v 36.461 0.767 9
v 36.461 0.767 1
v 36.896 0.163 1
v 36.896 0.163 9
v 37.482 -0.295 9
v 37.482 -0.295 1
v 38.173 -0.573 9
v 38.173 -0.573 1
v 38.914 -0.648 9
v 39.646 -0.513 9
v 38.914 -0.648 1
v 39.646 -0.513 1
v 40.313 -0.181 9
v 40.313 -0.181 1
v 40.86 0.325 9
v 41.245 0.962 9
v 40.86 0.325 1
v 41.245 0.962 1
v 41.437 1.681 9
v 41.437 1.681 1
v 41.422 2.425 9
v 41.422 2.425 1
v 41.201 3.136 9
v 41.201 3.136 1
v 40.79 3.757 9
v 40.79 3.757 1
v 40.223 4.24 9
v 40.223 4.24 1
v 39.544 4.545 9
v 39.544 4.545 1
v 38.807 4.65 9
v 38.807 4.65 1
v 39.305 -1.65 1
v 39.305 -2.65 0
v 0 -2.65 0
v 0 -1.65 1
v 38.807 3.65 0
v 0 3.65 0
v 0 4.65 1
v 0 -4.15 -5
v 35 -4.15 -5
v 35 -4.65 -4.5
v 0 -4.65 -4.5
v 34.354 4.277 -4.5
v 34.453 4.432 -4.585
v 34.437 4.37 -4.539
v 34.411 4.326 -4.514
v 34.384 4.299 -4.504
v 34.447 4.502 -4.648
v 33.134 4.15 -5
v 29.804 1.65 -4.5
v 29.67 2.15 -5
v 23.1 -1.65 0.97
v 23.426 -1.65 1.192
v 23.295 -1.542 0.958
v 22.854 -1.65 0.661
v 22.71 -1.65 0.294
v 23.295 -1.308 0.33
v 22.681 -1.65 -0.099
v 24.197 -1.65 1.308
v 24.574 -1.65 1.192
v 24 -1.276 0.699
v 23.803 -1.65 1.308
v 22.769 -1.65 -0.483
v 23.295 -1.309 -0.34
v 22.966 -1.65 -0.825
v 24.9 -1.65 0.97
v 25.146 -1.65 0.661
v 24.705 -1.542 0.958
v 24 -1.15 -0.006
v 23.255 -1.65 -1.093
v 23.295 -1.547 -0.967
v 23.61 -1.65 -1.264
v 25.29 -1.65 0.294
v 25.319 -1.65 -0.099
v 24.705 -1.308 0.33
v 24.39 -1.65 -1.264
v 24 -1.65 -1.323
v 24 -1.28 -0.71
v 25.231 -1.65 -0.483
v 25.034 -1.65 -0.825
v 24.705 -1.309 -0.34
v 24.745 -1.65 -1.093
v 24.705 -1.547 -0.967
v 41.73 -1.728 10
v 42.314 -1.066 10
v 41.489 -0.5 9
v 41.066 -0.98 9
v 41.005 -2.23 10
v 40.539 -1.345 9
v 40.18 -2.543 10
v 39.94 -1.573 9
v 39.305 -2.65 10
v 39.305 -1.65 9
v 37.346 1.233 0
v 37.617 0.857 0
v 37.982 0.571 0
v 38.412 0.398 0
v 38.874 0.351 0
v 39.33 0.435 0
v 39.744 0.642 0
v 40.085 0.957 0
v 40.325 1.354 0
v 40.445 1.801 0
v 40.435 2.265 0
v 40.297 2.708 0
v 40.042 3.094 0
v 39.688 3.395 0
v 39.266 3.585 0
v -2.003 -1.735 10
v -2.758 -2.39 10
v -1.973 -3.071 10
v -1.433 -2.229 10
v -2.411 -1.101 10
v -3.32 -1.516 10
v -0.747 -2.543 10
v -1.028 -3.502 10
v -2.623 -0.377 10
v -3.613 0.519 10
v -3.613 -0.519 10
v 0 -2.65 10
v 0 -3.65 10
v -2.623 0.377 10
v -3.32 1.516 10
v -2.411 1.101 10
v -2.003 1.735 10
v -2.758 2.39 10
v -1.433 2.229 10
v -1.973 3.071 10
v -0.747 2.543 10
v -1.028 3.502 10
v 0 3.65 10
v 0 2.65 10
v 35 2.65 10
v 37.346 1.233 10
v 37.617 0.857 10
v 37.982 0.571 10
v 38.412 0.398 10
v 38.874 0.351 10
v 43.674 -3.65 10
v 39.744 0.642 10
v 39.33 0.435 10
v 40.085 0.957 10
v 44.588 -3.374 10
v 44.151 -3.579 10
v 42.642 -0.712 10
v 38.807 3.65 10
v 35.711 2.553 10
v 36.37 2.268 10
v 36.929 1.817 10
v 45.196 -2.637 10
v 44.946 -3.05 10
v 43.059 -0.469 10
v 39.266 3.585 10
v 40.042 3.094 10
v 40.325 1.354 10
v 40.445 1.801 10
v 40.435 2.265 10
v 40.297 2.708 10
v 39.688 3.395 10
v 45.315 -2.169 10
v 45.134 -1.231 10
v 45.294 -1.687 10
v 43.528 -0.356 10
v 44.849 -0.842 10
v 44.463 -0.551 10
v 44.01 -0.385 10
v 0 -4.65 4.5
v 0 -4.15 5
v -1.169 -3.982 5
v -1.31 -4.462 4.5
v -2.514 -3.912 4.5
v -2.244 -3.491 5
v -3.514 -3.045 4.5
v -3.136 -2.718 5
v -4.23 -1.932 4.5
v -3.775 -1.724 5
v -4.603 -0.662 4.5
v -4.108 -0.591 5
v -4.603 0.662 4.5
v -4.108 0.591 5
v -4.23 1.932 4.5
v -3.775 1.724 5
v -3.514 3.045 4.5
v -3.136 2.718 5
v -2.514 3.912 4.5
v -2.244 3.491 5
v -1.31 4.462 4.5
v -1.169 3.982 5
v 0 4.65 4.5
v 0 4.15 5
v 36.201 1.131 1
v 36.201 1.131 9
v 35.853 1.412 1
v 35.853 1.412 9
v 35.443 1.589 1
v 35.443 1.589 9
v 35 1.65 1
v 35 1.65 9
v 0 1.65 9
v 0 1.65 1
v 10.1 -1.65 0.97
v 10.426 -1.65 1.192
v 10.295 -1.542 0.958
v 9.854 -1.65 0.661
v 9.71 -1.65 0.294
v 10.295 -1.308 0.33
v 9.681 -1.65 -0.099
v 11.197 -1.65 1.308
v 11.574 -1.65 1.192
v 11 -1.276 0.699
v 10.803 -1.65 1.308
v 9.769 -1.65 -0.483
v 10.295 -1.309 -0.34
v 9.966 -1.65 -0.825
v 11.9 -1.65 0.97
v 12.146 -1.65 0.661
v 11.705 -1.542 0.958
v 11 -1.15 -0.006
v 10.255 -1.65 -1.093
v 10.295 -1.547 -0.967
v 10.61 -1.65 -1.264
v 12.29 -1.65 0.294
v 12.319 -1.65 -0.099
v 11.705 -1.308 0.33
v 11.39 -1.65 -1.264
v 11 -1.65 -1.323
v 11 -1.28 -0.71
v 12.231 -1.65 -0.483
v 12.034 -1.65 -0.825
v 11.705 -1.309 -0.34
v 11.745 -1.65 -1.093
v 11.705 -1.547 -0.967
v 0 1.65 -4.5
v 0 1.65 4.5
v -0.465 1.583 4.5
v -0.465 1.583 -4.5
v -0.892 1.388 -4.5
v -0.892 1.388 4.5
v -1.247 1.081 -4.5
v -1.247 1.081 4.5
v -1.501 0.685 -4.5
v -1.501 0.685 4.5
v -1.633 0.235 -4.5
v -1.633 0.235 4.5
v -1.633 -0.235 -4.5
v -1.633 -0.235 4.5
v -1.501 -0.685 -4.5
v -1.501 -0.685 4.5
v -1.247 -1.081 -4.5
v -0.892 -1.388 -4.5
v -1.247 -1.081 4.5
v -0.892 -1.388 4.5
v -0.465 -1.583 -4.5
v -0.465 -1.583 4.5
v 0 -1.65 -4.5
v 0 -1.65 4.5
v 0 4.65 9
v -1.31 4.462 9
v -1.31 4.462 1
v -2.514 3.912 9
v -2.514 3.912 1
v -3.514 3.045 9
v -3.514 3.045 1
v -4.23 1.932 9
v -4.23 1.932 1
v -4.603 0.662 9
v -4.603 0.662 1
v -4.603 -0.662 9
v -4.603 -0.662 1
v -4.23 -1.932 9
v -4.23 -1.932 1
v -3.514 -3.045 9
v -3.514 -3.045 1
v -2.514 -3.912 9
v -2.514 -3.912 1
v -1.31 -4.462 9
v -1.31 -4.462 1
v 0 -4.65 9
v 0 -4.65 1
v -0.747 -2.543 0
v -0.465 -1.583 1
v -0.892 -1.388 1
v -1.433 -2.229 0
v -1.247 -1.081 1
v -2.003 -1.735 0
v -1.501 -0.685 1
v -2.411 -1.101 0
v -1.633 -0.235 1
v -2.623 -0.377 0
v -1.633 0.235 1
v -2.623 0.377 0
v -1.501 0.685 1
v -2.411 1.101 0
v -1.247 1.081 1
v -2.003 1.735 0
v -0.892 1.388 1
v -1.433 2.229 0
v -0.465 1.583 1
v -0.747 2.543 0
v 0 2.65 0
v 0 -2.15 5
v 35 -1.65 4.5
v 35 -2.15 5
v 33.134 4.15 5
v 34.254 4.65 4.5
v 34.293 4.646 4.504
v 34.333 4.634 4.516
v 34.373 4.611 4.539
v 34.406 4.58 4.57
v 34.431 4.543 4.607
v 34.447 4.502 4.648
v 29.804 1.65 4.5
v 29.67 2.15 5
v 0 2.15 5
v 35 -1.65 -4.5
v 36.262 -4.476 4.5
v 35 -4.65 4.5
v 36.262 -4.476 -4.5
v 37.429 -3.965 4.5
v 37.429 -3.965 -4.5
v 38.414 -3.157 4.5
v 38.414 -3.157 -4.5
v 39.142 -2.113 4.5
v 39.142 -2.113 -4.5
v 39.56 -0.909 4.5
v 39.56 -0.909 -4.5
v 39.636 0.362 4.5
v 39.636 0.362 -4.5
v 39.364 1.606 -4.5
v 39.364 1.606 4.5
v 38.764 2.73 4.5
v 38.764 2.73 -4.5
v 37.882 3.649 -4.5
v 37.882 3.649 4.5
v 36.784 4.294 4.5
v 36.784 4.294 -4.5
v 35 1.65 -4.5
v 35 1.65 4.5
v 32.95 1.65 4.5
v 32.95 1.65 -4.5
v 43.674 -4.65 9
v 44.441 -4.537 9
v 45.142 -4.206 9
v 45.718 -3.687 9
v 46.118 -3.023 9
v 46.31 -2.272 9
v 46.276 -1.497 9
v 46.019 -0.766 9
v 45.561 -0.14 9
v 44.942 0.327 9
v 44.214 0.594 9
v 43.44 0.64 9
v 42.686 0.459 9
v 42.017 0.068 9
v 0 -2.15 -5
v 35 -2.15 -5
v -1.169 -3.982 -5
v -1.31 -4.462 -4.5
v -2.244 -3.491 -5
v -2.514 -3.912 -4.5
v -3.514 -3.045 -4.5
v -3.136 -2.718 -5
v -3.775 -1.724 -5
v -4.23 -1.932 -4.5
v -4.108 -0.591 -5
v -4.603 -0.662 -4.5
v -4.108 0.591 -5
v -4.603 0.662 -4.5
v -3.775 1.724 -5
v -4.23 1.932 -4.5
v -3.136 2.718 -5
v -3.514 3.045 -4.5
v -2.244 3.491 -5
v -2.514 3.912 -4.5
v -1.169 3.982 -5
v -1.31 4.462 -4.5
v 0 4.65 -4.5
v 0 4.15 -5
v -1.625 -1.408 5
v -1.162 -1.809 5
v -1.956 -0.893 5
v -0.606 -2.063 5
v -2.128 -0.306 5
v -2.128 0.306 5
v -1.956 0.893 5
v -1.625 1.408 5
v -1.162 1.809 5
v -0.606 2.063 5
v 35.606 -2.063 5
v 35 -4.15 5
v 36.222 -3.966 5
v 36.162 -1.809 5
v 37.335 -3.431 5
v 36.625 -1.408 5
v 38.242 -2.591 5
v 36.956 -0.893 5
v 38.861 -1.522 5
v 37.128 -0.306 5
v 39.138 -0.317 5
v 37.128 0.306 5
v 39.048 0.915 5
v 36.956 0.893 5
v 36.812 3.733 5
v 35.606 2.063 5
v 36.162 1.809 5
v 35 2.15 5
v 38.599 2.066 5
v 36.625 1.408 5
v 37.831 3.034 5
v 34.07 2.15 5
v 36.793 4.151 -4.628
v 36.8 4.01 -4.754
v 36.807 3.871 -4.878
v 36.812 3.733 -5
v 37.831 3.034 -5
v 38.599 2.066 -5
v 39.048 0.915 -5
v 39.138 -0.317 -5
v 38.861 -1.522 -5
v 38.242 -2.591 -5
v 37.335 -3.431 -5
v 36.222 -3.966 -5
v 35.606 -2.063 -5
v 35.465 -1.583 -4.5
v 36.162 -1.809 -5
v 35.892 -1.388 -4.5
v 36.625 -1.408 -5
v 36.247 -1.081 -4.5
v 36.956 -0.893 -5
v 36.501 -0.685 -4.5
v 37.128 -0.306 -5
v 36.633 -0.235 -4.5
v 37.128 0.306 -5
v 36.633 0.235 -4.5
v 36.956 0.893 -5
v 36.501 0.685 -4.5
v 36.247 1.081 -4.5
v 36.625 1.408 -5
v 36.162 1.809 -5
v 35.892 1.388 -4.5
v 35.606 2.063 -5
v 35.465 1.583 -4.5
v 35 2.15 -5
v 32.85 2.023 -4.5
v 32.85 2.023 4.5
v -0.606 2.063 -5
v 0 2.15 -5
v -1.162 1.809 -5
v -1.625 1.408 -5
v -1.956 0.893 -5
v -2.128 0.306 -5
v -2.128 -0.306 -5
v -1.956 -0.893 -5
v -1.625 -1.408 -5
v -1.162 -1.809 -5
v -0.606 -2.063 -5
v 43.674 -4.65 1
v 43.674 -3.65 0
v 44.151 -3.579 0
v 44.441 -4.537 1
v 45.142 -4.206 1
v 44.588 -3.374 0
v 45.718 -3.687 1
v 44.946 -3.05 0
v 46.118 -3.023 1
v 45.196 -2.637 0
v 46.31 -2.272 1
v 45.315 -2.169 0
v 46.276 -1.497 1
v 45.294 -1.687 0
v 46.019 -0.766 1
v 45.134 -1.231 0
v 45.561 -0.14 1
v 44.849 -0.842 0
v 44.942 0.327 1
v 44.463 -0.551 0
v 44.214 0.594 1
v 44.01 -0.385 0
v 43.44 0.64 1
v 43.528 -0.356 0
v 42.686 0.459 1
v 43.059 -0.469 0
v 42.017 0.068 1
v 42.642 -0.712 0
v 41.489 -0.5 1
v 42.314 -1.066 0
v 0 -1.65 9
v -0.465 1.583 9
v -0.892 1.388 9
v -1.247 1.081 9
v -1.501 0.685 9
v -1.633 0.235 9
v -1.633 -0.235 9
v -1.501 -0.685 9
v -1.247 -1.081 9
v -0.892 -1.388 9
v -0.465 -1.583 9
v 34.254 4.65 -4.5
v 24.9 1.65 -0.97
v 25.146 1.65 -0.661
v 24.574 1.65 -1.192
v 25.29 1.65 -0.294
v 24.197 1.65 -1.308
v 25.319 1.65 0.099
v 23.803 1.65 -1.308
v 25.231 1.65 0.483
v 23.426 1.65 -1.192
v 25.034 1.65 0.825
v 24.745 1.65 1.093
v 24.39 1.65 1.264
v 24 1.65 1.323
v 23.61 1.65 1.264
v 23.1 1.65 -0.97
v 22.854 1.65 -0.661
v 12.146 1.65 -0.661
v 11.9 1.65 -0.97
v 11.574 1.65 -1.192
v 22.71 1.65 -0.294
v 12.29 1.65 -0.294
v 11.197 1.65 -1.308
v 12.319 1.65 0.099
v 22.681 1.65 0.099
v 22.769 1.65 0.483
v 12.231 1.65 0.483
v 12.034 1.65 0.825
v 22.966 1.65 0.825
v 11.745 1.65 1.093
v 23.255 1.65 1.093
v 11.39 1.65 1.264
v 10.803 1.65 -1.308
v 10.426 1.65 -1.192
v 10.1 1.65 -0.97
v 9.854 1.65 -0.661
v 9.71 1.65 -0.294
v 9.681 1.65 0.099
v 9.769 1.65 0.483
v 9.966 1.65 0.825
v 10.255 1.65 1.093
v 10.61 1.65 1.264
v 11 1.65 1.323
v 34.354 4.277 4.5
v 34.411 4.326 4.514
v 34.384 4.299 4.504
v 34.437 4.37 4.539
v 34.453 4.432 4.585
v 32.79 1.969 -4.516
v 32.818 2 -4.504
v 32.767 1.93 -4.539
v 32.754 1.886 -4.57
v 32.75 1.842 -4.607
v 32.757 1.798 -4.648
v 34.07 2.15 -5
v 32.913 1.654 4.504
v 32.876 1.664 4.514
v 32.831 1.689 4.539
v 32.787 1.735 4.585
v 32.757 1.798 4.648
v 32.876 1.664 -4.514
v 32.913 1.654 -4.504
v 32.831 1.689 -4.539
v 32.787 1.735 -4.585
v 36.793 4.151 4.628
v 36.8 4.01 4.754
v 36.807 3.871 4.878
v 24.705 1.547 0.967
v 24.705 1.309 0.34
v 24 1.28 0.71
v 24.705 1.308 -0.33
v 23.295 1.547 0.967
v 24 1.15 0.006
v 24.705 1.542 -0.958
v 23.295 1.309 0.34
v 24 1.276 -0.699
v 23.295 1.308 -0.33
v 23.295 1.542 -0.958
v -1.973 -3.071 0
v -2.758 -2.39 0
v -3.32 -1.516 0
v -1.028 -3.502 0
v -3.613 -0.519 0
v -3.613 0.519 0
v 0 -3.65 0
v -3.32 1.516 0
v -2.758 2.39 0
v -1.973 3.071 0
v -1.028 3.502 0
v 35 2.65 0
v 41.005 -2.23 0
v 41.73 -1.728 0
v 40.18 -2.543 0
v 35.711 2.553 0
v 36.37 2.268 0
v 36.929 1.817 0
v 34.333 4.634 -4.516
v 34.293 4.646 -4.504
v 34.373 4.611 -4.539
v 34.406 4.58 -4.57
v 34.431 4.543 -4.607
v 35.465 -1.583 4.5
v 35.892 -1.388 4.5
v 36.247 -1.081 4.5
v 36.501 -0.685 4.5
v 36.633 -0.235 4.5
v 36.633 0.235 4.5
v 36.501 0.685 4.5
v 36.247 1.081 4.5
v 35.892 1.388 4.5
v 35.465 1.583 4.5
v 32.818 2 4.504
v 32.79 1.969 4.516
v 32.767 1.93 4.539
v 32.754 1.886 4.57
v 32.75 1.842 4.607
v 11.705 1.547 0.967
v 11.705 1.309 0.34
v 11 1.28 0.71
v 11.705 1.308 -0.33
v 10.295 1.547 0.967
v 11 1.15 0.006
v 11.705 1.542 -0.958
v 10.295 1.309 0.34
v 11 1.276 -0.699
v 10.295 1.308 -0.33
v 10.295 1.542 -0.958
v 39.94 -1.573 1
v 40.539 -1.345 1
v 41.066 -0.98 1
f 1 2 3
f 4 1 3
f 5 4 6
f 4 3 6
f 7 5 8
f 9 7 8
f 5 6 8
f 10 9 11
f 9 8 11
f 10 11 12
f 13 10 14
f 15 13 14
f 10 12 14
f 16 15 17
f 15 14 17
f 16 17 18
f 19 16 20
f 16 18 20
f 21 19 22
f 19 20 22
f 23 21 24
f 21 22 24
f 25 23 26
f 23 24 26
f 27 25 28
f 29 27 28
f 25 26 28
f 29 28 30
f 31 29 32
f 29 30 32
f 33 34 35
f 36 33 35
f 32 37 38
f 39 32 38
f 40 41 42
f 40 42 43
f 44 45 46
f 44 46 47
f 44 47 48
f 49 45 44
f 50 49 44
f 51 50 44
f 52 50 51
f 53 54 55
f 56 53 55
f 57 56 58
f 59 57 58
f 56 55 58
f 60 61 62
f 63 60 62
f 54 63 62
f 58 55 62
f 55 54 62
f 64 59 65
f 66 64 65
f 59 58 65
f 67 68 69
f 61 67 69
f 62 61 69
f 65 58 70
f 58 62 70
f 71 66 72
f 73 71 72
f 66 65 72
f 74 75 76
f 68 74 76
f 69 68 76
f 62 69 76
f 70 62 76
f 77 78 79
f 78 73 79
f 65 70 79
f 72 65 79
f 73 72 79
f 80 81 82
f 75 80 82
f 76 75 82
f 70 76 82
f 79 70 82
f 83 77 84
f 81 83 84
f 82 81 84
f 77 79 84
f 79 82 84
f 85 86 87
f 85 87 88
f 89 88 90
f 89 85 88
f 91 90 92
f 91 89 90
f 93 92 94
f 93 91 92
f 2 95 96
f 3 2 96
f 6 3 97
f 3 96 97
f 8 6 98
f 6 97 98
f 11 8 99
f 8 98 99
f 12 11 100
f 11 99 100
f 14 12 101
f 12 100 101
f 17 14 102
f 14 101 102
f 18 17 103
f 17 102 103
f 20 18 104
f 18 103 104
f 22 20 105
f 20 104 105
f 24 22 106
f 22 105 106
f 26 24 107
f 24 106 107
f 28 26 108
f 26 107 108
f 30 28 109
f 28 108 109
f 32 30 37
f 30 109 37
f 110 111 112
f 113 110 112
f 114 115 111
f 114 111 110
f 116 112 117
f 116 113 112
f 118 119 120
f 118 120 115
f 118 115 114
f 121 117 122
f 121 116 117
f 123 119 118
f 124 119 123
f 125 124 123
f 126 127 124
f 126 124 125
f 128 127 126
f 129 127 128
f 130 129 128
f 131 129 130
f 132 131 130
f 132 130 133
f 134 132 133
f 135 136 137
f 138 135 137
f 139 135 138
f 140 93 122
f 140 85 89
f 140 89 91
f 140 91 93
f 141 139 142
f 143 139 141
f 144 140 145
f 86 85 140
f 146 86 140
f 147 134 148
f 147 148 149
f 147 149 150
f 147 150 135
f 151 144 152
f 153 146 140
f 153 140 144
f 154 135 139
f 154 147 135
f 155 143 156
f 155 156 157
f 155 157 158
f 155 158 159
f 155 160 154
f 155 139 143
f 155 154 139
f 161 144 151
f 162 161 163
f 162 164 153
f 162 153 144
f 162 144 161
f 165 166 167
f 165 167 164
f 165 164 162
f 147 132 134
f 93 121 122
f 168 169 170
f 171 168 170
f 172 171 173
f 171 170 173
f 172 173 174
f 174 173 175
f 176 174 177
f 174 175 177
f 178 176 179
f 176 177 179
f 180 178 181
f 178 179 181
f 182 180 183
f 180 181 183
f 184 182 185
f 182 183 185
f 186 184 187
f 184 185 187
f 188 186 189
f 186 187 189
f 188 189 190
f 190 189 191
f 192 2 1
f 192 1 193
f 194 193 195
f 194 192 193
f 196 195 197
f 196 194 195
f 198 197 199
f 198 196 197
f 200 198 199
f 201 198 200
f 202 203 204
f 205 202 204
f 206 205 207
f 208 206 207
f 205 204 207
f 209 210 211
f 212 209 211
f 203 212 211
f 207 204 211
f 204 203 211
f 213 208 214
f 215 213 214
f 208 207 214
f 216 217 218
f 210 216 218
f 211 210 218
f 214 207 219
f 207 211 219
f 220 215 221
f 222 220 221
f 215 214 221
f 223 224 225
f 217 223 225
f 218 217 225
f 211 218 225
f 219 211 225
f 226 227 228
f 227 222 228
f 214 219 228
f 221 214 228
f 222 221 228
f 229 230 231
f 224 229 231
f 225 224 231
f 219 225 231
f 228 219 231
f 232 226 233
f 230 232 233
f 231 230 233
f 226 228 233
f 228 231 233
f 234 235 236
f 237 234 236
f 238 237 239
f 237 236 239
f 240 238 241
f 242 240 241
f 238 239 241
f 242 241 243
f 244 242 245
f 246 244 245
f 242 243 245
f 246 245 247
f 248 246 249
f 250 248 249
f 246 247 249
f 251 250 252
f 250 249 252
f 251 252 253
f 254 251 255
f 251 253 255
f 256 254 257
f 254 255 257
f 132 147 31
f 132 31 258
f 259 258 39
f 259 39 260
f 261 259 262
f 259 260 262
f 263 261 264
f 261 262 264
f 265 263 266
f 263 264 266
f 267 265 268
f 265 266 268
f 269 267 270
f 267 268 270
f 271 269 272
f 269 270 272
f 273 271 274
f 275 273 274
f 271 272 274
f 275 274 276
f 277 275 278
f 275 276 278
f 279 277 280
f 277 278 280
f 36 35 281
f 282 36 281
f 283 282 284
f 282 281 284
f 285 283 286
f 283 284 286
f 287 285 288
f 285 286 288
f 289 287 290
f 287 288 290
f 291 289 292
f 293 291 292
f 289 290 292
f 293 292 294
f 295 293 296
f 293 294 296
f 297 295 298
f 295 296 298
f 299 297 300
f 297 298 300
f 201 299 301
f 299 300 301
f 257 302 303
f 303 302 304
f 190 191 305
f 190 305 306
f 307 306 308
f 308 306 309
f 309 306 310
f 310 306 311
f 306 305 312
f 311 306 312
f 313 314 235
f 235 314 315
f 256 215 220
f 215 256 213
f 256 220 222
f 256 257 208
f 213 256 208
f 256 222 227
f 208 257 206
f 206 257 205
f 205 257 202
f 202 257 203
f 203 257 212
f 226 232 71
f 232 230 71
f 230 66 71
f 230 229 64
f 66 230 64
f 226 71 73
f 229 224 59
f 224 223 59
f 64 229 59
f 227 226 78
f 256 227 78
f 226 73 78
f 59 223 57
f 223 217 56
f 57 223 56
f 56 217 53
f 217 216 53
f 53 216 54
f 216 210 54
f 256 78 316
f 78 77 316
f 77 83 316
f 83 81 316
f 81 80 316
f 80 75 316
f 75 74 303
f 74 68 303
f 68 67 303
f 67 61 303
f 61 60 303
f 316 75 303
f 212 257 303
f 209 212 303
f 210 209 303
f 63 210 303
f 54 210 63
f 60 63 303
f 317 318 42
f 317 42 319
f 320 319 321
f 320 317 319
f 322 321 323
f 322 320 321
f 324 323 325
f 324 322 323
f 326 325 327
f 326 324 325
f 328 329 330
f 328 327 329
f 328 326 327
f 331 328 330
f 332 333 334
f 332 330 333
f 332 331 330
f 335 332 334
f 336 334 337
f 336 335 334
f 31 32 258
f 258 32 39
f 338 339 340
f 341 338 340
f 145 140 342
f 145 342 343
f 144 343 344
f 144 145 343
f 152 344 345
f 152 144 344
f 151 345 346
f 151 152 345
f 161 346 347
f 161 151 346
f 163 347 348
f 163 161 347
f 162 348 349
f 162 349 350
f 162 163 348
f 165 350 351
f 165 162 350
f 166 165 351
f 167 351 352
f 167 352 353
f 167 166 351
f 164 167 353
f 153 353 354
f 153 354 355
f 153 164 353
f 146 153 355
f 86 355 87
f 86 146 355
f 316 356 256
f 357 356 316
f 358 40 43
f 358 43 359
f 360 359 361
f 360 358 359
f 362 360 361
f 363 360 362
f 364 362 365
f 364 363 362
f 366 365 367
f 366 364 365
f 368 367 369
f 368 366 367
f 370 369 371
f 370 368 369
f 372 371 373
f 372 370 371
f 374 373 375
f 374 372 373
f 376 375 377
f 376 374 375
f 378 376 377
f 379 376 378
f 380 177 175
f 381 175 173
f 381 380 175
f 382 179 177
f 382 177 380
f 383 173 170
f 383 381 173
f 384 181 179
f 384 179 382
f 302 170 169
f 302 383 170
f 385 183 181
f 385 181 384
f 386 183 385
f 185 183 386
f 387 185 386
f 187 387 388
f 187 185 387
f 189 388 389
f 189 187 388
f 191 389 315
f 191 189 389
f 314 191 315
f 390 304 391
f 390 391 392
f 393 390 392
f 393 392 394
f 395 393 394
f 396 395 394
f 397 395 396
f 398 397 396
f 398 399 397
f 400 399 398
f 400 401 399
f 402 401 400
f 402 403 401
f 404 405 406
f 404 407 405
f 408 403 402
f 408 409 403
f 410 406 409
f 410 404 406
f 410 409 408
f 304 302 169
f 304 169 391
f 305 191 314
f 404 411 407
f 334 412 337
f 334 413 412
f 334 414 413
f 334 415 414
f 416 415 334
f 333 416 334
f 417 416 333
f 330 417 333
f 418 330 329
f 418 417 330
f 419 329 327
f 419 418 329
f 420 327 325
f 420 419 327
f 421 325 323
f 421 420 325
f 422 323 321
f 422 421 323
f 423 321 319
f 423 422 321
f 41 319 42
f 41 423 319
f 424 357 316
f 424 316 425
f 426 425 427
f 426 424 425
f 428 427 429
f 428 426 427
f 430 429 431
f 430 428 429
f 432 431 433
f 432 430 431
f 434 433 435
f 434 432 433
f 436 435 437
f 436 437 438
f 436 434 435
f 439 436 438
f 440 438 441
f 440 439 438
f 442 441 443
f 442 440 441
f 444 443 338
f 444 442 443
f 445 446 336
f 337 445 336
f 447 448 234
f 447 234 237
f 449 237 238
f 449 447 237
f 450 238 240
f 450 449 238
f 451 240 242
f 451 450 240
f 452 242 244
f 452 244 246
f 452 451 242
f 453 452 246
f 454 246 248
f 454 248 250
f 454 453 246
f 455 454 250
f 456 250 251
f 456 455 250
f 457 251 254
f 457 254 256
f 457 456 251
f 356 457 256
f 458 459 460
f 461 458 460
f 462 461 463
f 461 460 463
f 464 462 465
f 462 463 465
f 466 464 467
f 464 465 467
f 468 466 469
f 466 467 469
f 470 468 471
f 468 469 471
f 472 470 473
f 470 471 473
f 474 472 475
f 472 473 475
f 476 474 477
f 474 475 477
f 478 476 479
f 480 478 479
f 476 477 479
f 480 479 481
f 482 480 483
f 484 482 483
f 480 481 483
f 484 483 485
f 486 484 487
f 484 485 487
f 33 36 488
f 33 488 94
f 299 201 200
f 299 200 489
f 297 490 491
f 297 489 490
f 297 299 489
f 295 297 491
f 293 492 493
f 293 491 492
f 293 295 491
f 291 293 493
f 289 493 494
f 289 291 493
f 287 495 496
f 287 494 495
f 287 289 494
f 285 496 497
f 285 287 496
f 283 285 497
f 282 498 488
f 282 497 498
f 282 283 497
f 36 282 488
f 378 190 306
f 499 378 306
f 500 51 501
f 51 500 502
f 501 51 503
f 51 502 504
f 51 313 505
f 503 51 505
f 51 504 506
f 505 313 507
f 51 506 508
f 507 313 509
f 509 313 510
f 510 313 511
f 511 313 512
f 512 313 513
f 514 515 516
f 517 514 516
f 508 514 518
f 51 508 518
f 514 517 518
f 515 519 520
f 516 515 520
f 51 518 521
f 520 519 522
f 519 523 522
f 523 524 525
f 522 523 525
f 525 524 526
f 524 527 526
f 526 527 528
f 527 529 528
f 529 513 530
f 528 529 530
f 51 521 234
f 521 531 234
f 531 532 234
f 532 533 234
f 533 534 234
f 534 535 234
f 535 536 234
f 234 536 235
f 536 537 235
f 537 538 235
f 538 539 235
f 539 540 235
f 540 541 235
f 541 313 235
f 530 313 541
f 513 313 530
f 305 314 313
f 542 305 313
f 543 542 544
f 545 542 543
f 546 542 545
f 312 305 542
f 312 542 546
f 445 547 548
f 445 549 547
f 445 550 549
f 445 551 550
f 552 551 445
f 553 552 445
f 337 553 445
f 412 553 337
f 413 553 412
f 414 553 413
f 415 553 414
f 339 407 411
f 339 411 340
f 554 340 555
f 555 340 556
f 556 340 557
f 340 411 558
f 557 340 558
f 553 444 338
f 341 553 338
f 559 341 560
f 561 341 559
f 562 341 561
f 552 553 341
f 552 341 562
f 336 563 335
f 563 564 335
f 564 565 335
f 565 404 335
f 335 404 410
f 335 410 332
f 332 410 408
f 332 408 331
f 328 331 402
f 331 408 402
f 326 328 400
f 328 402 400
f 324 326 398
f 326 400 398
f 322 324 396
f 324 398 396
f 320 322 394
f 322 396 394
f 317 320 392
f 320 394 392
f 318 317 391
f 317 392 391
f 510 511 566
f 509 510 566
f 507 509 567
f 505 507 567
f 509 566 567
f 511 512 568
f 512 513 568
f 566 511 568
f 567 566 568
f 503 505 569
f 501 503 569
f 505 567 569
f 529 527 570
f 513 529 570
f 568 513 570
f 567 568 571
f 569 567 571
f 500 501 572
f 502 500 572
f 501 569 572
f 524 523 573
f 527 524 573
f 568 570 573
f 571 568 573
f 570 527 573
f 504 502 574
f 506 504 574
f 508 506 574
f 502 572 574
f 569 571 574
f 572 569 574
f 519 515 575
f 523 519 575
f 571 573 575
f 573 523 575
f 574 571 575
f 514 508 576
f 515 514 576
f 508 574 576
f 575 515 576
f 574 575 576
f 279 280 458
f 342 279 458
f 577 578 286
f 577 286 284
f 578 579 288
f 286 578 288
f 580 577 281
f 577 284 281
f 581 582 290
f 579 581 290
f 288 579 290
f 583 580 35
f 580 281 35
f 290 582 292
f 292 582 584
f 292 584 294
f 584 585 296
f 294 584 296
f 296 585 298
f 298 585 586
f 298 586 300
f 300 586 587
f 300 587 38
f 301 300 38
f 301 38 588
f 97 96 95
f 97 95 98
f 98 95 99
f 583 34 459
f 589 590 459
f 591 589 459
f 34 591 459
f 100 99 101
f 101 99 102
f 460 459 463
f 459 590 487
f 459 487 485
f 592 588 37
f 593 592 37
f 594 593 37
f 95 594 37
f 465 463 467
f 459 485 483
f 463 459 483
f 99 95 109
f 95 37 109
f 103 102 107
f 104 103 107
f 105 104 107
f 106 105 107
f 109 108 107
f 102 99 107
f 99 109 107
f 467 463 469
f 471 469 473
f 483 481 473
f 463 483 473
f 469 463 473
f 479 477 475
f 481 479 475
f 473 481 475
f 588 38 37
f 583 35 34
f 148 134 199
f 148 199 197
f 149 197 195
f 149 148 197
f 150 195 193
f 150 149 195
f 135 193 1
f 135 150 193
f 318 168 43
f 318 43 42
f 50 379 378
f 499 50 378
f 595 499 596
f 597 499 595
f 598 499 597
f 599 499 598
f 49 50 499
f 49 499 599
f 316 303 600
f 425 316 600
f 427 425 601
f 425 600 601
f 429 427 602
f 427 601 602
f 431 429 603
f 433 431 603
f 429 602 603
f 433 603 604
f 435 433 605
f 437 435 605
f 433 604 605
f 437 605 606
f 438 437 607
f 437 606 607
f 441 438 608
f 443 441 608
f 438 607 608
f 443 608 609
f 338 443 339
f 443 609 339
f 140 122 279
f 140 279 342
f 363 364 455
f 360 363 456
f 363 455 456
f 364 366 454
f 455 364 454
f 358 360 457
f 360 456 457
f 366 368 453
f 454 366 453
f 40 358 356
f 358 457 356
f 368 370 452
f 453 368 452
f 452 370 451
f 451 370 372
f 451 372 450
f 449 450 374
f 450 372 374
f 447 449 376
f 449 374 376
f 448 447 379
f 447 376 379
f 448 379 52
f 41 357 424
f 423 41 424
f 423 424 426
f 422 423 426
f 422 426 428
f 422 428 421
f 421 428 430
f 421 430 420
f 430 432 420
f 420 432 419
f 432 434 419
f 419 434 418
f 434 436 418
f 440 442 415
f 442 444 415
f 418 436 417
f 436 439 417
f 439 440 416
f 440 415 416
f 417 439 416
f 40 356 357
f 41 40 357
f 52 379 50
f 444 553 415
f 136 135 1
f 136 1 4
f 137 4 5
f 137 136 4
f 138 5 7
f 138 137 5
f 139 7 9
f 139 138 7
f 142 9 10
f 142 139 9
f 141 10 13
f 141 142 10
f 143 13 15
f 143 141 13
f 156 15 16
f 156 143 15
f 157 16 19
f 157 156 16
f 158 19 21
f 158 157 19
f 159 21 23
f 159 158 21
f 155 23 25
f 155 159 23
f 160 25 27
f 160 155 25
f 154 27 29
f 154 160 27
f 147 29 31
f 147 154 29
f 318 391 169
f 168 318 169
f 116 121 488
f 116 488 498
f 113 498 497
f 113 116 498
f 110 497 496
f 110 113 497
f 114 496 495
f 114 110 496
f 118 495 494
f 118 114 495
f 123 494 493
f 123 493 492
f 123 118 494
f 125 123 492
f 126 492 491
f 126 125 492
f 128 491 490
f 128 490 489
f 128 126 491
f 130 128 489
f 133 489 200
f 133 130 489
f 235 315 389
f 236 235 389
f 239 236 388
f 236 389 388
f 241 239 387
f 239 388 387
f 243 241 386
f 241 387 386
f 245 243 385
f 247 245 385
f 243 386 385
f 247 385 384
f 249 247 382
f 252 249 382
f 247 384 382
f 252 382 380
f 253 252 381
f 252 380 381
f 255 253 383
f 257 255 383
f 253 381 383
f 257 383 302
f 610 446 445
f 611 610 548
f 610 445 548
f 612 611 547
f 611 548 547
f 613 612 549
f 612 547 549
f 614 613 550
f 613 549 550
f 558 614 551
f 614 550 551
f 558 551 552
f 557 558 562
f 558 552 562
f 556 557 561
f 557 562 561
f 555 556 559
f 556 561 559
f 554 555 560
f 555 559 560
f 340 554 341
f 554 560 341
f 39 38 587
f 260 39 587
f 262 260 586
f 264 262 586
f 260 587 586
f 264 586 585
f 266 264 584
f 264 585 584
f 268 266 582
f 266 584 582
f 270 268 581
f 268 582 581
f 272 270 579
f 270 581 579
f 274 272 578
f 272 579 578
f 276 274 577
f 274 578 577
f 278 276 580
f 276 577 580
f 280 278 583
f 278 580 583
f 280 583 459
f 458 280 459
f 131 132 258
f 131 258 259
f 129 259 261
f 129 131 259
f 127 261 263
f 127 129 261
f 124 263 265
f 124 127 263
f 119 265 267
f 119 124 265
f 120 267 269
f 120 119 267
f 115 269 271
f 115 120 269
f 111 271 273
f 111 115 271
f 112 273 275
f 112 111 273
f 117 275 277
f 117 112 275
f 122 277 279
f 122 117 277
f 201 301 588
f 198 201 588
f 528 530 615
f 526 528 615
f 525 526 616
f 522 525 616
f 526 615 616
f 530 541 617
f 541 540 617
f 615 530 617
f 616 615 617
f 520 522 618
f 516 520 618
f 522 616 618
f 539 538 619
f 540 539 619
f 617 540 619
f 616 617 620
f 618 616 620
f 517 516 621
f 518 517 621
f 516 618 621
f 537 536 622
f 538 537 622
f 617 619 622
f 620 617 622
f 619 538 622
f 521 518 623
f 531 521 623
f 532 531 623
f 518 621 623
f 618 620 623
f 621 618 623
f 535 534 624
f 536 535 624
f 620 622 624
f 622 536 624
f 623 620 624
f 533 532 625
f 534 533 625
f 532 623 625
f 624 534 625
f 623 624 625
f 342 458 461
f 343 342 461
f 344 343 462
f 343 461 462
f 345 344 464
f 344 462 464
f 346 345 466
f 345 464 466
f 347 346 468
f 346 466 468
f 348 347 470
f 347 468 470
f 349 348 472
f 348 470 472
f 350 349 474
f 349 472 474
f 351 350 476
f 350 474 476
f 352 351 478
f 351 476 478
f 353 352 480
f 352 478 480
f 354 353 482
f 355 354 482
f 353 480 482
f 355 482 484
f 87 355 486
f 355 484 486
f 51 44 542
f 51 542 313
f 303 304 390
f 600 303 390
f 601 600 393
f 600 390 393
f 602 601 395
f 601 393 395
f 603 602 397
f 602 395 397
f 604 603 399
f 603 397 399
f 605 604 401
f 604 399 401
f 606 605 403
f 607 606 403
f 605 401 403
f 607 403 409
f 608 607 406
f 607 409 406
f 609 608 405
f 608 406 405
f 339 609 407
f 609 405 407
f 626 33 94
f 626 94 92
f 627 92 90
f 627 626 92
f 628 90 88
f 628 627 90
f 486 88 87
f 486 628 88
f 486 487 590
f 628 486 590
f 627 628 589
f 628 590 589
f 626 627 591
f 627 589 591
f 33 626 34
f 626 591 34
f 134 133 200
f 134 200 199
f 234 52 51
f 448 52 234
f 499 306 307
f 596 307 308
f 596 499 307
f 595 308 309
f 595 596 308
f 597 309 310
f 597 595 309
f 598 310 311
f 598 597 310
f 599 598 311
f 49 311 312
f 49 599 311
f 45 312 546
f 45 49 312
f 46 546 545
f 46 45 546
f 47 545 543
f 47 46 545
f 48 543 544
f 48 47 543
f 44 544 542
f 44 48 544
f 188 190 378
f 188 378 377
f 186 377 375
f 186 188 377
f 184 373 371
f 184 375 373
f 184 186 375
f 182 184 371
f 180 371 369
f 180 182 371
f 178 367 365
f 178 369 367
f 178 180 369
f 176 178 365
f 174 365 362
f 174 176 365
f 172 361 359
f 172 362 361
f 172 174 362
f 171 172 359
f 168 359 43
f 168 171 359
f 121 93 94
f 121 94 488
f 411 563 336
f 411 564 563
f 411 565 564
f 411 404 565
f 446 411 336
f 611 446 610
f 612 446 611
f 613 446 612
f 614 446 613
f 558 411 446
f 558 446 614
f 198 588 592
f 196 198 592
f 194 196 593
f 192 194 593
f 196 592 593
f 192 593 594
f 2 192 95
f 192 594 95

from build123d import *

# Parameters (mm, degrees)
PAD_DEPTH           = 10
CHAMFER_SIZE        = 1
PAD001_DEPTH        = 5
POCKET_DEPTH        = 5.001
POCKET_DEPTH_BACK   = -5.001
CHAMFER001_SIZE     = 0.5
FILLET_R            = 0.2
REVOLUTION_ANGLE    = 180
REVOLUTION001_ANGLE = 180


with BuildPart() as clip:
    # Sketch → Pad (new body)
    with BuildSketch(Plane.XY):
        with BuildLine():
            ThreePointArc((36.460662, 0.767442), (41.074698, 0.629558), (38.806573, 4.65))
            Line((38.806573, 4.65), (0, 4.65))
            ThreePointArc((0, 4.65), (-4.65, 0), (0, -4.65))
            Line((0, -4.65), (43.673811, -4.65))
            ThreePointArc((43.673811, -4.65), (46.018752, -0.765597), (41.489205, -0.5))
            ThreePointArc((39.3046, -1.65), (40.539003, -1.344941), (41.489205, -0.5))
            Line((0, -1.65), (39.3046, -1.65))
            ThreePointArc((0, 1.65), (-1.65, 0), (0, -1.65))
            Line((35, 1.65), (0, 1.65))
            ThreePointArc((36.460662, 0.767442), (35.853294, 1.412229), (35, 1.65))
        make_face()
    extrude(amount=PAD_DEPTH)

    # Chamfer
    chamfer_edges = [clip.edges().sort_by_distance(p)[0] for p in [
        (41.074698, 0.629558, 10),
        (19.403287, 4.65, 10),
        (-4.65, 0, 10),
        (21.836905, -4.65, 10),
        (46.018752, -0.765597, 10),
        (40.539003, -1.344941, 10),
        (19.6523, -1.65, 10),
        (-1.65, 0, 10),
        (17.5, 1.65, 10),
        (35.853294, 1.412229, 10),
        (41.074698, 0.629558, 0),
        (19.403287, 4.65, 0),
        (-4.65, 0, 0),
        (21.836905, -4.65, 0),
        (46.018752, -0.765597, 0),
        (40.539003, -1.344941, 0),
        (19.6523, -1.65, 0),
        (-1.65, 0, 0),
        (17.5, 1.65, 0),
        (35.853294, 1.412229, 0),
    ]]
    chamfer(chamfer_edges, length=CHAMFER_SIZE)


with BuildPart() as clip2:
    # Sketch001 → Pad001 (new body, symmetric)
    with BuildSketch(Plane.XY):
        with BuildLine():
            ThreePointArc((0, 4.65), (-4.65, -7e-06), (1.3e-05, -4.65))
            Line((1.3e-05, -4.65), (35.000011, -4.65))
            ThreePointArc((35.000011, -4.65), (39.650011, 0), (35.000011, 4.65))
            Line((0, 4.65), (35.000011, 4.65))
        make_face()
        with BuildLine():
            Line((0, -1.65), (35, -1.65))
            ThreePointArc((35, -1.65), (36.650011, -5e-06), (35.000011, 1.65))
            Line((35.000011, 1.65), (0, 1.65))
            ThreePointArc((0, 1.65), (-1.65, 0), (0, -1.65))
        make_face(mode=Mode.SUBTRACT)
    extrude(amount=PAD001_DEPTH, both=True)

    # Sketch002 → Pocket (cut, two sides)
    with BuildSketch(Plane.XY) as pocket_sk:
        Polygon((32.203858, 1.65), (37.400011, 4.65), (35.000011, 4.65), (29.803858, 1.65), align=None)
    extrude(amount=-POCKET_DEPTH, mode=Mode.SUBTRACT)
    extrude(pocket_sk.sketch, amount=-POCKET_DEPTH_BACK, mode=Mode.SUBTRACT)

    # Chamfer001
    chamfer001_edges = [clip2.edges().sort_by_distance(p)[0] for p in [
        (17.500005, 4.65, 5),
        (32.401934, 3.15, 5),
        (14.901929, 1.65, 5),
        (-1.65, 0, 5),
        (17.5, -1.65, 5),
        (36.650011, -5e-06, 5),
        (33.601934, 1.65, 5),
        (34.49384, 2.972121, 5),
        (39.560204, -0.90947, 5),
        (17.500012, -4.65, 5),
        (-4.65, -7e-06, 5),
        (17.500005, 4.65, -5),
        (32.401934, 3.15, -5),
        (14.901929, 1.65, -5),
        (-1.65, 0, -5),
        (17.5, -1.65, -5),
        (36.650011, -5e-06, -5),
        (33.601934, 1.65, -5),
        (34.49384, 2.972121, -5),
        (39.560204, -0.90947, -5),
        (17.500012, -4.65, -5),
        (-4.65, -7e-06, -5),
    ]]
    chamfer(chamfer001_edges, length=CHAMFER001_SIZE)

    # Fillet
    fillet_edges = [clip2.edges().sort_by_distance(p)[0] for p in [
        (32.203858, 1.65, 0),
        (35.000011, 4.65, 0),
    ]]
    fillet(fillet_edges, radius=FILLET_R)

    # Sketch003 (on Face36 of Fillet) → Revolution (revolve)
    with BuildSketch(Plane(origin=(0, -3.15, 0), x_dir=(-1, 0, 0), z_dir=(0, 1, 0))):
        with BuildLine():
            ThreePointArc((-9, 0), (-11, 2), (-13, 0))
            Line((-13, 0), (-9, 0))
        make_face()
        with BuildLine():
            ThreePointArc((-22, 0), (-24, 2), (-26, 0))
            Line((-26, 0), (-22, 0))
        make_face()
    revolve(axis=Axis((0, -3.15, 0), (-1, 0, 0)), revolution_arc=REVOLUTION_ANGLE)

    # Sketch004 (on Face22 of Revolution) → Revolution001 (revolve)
    with BuildSketch(Plane.XZ.offset(-3.15)):
        with BuildLine():
            ThreePointArc((13, 0), (11, 2), (9, 0))
            Line((9, 0), (13, 0))
        make_face()
        with BuildLine():
            ThreePointArc((26, 0), (24, 2), (22, 0))
            Line((22, 0), (26, 0))
        make_face()
    revolve(axis=Axis((0, 3.15, 0), (1, 0, 0)), revolution_arc=REVOLUTION001_ANGLE)


solid = Compound([clip.part, clip2.part])
